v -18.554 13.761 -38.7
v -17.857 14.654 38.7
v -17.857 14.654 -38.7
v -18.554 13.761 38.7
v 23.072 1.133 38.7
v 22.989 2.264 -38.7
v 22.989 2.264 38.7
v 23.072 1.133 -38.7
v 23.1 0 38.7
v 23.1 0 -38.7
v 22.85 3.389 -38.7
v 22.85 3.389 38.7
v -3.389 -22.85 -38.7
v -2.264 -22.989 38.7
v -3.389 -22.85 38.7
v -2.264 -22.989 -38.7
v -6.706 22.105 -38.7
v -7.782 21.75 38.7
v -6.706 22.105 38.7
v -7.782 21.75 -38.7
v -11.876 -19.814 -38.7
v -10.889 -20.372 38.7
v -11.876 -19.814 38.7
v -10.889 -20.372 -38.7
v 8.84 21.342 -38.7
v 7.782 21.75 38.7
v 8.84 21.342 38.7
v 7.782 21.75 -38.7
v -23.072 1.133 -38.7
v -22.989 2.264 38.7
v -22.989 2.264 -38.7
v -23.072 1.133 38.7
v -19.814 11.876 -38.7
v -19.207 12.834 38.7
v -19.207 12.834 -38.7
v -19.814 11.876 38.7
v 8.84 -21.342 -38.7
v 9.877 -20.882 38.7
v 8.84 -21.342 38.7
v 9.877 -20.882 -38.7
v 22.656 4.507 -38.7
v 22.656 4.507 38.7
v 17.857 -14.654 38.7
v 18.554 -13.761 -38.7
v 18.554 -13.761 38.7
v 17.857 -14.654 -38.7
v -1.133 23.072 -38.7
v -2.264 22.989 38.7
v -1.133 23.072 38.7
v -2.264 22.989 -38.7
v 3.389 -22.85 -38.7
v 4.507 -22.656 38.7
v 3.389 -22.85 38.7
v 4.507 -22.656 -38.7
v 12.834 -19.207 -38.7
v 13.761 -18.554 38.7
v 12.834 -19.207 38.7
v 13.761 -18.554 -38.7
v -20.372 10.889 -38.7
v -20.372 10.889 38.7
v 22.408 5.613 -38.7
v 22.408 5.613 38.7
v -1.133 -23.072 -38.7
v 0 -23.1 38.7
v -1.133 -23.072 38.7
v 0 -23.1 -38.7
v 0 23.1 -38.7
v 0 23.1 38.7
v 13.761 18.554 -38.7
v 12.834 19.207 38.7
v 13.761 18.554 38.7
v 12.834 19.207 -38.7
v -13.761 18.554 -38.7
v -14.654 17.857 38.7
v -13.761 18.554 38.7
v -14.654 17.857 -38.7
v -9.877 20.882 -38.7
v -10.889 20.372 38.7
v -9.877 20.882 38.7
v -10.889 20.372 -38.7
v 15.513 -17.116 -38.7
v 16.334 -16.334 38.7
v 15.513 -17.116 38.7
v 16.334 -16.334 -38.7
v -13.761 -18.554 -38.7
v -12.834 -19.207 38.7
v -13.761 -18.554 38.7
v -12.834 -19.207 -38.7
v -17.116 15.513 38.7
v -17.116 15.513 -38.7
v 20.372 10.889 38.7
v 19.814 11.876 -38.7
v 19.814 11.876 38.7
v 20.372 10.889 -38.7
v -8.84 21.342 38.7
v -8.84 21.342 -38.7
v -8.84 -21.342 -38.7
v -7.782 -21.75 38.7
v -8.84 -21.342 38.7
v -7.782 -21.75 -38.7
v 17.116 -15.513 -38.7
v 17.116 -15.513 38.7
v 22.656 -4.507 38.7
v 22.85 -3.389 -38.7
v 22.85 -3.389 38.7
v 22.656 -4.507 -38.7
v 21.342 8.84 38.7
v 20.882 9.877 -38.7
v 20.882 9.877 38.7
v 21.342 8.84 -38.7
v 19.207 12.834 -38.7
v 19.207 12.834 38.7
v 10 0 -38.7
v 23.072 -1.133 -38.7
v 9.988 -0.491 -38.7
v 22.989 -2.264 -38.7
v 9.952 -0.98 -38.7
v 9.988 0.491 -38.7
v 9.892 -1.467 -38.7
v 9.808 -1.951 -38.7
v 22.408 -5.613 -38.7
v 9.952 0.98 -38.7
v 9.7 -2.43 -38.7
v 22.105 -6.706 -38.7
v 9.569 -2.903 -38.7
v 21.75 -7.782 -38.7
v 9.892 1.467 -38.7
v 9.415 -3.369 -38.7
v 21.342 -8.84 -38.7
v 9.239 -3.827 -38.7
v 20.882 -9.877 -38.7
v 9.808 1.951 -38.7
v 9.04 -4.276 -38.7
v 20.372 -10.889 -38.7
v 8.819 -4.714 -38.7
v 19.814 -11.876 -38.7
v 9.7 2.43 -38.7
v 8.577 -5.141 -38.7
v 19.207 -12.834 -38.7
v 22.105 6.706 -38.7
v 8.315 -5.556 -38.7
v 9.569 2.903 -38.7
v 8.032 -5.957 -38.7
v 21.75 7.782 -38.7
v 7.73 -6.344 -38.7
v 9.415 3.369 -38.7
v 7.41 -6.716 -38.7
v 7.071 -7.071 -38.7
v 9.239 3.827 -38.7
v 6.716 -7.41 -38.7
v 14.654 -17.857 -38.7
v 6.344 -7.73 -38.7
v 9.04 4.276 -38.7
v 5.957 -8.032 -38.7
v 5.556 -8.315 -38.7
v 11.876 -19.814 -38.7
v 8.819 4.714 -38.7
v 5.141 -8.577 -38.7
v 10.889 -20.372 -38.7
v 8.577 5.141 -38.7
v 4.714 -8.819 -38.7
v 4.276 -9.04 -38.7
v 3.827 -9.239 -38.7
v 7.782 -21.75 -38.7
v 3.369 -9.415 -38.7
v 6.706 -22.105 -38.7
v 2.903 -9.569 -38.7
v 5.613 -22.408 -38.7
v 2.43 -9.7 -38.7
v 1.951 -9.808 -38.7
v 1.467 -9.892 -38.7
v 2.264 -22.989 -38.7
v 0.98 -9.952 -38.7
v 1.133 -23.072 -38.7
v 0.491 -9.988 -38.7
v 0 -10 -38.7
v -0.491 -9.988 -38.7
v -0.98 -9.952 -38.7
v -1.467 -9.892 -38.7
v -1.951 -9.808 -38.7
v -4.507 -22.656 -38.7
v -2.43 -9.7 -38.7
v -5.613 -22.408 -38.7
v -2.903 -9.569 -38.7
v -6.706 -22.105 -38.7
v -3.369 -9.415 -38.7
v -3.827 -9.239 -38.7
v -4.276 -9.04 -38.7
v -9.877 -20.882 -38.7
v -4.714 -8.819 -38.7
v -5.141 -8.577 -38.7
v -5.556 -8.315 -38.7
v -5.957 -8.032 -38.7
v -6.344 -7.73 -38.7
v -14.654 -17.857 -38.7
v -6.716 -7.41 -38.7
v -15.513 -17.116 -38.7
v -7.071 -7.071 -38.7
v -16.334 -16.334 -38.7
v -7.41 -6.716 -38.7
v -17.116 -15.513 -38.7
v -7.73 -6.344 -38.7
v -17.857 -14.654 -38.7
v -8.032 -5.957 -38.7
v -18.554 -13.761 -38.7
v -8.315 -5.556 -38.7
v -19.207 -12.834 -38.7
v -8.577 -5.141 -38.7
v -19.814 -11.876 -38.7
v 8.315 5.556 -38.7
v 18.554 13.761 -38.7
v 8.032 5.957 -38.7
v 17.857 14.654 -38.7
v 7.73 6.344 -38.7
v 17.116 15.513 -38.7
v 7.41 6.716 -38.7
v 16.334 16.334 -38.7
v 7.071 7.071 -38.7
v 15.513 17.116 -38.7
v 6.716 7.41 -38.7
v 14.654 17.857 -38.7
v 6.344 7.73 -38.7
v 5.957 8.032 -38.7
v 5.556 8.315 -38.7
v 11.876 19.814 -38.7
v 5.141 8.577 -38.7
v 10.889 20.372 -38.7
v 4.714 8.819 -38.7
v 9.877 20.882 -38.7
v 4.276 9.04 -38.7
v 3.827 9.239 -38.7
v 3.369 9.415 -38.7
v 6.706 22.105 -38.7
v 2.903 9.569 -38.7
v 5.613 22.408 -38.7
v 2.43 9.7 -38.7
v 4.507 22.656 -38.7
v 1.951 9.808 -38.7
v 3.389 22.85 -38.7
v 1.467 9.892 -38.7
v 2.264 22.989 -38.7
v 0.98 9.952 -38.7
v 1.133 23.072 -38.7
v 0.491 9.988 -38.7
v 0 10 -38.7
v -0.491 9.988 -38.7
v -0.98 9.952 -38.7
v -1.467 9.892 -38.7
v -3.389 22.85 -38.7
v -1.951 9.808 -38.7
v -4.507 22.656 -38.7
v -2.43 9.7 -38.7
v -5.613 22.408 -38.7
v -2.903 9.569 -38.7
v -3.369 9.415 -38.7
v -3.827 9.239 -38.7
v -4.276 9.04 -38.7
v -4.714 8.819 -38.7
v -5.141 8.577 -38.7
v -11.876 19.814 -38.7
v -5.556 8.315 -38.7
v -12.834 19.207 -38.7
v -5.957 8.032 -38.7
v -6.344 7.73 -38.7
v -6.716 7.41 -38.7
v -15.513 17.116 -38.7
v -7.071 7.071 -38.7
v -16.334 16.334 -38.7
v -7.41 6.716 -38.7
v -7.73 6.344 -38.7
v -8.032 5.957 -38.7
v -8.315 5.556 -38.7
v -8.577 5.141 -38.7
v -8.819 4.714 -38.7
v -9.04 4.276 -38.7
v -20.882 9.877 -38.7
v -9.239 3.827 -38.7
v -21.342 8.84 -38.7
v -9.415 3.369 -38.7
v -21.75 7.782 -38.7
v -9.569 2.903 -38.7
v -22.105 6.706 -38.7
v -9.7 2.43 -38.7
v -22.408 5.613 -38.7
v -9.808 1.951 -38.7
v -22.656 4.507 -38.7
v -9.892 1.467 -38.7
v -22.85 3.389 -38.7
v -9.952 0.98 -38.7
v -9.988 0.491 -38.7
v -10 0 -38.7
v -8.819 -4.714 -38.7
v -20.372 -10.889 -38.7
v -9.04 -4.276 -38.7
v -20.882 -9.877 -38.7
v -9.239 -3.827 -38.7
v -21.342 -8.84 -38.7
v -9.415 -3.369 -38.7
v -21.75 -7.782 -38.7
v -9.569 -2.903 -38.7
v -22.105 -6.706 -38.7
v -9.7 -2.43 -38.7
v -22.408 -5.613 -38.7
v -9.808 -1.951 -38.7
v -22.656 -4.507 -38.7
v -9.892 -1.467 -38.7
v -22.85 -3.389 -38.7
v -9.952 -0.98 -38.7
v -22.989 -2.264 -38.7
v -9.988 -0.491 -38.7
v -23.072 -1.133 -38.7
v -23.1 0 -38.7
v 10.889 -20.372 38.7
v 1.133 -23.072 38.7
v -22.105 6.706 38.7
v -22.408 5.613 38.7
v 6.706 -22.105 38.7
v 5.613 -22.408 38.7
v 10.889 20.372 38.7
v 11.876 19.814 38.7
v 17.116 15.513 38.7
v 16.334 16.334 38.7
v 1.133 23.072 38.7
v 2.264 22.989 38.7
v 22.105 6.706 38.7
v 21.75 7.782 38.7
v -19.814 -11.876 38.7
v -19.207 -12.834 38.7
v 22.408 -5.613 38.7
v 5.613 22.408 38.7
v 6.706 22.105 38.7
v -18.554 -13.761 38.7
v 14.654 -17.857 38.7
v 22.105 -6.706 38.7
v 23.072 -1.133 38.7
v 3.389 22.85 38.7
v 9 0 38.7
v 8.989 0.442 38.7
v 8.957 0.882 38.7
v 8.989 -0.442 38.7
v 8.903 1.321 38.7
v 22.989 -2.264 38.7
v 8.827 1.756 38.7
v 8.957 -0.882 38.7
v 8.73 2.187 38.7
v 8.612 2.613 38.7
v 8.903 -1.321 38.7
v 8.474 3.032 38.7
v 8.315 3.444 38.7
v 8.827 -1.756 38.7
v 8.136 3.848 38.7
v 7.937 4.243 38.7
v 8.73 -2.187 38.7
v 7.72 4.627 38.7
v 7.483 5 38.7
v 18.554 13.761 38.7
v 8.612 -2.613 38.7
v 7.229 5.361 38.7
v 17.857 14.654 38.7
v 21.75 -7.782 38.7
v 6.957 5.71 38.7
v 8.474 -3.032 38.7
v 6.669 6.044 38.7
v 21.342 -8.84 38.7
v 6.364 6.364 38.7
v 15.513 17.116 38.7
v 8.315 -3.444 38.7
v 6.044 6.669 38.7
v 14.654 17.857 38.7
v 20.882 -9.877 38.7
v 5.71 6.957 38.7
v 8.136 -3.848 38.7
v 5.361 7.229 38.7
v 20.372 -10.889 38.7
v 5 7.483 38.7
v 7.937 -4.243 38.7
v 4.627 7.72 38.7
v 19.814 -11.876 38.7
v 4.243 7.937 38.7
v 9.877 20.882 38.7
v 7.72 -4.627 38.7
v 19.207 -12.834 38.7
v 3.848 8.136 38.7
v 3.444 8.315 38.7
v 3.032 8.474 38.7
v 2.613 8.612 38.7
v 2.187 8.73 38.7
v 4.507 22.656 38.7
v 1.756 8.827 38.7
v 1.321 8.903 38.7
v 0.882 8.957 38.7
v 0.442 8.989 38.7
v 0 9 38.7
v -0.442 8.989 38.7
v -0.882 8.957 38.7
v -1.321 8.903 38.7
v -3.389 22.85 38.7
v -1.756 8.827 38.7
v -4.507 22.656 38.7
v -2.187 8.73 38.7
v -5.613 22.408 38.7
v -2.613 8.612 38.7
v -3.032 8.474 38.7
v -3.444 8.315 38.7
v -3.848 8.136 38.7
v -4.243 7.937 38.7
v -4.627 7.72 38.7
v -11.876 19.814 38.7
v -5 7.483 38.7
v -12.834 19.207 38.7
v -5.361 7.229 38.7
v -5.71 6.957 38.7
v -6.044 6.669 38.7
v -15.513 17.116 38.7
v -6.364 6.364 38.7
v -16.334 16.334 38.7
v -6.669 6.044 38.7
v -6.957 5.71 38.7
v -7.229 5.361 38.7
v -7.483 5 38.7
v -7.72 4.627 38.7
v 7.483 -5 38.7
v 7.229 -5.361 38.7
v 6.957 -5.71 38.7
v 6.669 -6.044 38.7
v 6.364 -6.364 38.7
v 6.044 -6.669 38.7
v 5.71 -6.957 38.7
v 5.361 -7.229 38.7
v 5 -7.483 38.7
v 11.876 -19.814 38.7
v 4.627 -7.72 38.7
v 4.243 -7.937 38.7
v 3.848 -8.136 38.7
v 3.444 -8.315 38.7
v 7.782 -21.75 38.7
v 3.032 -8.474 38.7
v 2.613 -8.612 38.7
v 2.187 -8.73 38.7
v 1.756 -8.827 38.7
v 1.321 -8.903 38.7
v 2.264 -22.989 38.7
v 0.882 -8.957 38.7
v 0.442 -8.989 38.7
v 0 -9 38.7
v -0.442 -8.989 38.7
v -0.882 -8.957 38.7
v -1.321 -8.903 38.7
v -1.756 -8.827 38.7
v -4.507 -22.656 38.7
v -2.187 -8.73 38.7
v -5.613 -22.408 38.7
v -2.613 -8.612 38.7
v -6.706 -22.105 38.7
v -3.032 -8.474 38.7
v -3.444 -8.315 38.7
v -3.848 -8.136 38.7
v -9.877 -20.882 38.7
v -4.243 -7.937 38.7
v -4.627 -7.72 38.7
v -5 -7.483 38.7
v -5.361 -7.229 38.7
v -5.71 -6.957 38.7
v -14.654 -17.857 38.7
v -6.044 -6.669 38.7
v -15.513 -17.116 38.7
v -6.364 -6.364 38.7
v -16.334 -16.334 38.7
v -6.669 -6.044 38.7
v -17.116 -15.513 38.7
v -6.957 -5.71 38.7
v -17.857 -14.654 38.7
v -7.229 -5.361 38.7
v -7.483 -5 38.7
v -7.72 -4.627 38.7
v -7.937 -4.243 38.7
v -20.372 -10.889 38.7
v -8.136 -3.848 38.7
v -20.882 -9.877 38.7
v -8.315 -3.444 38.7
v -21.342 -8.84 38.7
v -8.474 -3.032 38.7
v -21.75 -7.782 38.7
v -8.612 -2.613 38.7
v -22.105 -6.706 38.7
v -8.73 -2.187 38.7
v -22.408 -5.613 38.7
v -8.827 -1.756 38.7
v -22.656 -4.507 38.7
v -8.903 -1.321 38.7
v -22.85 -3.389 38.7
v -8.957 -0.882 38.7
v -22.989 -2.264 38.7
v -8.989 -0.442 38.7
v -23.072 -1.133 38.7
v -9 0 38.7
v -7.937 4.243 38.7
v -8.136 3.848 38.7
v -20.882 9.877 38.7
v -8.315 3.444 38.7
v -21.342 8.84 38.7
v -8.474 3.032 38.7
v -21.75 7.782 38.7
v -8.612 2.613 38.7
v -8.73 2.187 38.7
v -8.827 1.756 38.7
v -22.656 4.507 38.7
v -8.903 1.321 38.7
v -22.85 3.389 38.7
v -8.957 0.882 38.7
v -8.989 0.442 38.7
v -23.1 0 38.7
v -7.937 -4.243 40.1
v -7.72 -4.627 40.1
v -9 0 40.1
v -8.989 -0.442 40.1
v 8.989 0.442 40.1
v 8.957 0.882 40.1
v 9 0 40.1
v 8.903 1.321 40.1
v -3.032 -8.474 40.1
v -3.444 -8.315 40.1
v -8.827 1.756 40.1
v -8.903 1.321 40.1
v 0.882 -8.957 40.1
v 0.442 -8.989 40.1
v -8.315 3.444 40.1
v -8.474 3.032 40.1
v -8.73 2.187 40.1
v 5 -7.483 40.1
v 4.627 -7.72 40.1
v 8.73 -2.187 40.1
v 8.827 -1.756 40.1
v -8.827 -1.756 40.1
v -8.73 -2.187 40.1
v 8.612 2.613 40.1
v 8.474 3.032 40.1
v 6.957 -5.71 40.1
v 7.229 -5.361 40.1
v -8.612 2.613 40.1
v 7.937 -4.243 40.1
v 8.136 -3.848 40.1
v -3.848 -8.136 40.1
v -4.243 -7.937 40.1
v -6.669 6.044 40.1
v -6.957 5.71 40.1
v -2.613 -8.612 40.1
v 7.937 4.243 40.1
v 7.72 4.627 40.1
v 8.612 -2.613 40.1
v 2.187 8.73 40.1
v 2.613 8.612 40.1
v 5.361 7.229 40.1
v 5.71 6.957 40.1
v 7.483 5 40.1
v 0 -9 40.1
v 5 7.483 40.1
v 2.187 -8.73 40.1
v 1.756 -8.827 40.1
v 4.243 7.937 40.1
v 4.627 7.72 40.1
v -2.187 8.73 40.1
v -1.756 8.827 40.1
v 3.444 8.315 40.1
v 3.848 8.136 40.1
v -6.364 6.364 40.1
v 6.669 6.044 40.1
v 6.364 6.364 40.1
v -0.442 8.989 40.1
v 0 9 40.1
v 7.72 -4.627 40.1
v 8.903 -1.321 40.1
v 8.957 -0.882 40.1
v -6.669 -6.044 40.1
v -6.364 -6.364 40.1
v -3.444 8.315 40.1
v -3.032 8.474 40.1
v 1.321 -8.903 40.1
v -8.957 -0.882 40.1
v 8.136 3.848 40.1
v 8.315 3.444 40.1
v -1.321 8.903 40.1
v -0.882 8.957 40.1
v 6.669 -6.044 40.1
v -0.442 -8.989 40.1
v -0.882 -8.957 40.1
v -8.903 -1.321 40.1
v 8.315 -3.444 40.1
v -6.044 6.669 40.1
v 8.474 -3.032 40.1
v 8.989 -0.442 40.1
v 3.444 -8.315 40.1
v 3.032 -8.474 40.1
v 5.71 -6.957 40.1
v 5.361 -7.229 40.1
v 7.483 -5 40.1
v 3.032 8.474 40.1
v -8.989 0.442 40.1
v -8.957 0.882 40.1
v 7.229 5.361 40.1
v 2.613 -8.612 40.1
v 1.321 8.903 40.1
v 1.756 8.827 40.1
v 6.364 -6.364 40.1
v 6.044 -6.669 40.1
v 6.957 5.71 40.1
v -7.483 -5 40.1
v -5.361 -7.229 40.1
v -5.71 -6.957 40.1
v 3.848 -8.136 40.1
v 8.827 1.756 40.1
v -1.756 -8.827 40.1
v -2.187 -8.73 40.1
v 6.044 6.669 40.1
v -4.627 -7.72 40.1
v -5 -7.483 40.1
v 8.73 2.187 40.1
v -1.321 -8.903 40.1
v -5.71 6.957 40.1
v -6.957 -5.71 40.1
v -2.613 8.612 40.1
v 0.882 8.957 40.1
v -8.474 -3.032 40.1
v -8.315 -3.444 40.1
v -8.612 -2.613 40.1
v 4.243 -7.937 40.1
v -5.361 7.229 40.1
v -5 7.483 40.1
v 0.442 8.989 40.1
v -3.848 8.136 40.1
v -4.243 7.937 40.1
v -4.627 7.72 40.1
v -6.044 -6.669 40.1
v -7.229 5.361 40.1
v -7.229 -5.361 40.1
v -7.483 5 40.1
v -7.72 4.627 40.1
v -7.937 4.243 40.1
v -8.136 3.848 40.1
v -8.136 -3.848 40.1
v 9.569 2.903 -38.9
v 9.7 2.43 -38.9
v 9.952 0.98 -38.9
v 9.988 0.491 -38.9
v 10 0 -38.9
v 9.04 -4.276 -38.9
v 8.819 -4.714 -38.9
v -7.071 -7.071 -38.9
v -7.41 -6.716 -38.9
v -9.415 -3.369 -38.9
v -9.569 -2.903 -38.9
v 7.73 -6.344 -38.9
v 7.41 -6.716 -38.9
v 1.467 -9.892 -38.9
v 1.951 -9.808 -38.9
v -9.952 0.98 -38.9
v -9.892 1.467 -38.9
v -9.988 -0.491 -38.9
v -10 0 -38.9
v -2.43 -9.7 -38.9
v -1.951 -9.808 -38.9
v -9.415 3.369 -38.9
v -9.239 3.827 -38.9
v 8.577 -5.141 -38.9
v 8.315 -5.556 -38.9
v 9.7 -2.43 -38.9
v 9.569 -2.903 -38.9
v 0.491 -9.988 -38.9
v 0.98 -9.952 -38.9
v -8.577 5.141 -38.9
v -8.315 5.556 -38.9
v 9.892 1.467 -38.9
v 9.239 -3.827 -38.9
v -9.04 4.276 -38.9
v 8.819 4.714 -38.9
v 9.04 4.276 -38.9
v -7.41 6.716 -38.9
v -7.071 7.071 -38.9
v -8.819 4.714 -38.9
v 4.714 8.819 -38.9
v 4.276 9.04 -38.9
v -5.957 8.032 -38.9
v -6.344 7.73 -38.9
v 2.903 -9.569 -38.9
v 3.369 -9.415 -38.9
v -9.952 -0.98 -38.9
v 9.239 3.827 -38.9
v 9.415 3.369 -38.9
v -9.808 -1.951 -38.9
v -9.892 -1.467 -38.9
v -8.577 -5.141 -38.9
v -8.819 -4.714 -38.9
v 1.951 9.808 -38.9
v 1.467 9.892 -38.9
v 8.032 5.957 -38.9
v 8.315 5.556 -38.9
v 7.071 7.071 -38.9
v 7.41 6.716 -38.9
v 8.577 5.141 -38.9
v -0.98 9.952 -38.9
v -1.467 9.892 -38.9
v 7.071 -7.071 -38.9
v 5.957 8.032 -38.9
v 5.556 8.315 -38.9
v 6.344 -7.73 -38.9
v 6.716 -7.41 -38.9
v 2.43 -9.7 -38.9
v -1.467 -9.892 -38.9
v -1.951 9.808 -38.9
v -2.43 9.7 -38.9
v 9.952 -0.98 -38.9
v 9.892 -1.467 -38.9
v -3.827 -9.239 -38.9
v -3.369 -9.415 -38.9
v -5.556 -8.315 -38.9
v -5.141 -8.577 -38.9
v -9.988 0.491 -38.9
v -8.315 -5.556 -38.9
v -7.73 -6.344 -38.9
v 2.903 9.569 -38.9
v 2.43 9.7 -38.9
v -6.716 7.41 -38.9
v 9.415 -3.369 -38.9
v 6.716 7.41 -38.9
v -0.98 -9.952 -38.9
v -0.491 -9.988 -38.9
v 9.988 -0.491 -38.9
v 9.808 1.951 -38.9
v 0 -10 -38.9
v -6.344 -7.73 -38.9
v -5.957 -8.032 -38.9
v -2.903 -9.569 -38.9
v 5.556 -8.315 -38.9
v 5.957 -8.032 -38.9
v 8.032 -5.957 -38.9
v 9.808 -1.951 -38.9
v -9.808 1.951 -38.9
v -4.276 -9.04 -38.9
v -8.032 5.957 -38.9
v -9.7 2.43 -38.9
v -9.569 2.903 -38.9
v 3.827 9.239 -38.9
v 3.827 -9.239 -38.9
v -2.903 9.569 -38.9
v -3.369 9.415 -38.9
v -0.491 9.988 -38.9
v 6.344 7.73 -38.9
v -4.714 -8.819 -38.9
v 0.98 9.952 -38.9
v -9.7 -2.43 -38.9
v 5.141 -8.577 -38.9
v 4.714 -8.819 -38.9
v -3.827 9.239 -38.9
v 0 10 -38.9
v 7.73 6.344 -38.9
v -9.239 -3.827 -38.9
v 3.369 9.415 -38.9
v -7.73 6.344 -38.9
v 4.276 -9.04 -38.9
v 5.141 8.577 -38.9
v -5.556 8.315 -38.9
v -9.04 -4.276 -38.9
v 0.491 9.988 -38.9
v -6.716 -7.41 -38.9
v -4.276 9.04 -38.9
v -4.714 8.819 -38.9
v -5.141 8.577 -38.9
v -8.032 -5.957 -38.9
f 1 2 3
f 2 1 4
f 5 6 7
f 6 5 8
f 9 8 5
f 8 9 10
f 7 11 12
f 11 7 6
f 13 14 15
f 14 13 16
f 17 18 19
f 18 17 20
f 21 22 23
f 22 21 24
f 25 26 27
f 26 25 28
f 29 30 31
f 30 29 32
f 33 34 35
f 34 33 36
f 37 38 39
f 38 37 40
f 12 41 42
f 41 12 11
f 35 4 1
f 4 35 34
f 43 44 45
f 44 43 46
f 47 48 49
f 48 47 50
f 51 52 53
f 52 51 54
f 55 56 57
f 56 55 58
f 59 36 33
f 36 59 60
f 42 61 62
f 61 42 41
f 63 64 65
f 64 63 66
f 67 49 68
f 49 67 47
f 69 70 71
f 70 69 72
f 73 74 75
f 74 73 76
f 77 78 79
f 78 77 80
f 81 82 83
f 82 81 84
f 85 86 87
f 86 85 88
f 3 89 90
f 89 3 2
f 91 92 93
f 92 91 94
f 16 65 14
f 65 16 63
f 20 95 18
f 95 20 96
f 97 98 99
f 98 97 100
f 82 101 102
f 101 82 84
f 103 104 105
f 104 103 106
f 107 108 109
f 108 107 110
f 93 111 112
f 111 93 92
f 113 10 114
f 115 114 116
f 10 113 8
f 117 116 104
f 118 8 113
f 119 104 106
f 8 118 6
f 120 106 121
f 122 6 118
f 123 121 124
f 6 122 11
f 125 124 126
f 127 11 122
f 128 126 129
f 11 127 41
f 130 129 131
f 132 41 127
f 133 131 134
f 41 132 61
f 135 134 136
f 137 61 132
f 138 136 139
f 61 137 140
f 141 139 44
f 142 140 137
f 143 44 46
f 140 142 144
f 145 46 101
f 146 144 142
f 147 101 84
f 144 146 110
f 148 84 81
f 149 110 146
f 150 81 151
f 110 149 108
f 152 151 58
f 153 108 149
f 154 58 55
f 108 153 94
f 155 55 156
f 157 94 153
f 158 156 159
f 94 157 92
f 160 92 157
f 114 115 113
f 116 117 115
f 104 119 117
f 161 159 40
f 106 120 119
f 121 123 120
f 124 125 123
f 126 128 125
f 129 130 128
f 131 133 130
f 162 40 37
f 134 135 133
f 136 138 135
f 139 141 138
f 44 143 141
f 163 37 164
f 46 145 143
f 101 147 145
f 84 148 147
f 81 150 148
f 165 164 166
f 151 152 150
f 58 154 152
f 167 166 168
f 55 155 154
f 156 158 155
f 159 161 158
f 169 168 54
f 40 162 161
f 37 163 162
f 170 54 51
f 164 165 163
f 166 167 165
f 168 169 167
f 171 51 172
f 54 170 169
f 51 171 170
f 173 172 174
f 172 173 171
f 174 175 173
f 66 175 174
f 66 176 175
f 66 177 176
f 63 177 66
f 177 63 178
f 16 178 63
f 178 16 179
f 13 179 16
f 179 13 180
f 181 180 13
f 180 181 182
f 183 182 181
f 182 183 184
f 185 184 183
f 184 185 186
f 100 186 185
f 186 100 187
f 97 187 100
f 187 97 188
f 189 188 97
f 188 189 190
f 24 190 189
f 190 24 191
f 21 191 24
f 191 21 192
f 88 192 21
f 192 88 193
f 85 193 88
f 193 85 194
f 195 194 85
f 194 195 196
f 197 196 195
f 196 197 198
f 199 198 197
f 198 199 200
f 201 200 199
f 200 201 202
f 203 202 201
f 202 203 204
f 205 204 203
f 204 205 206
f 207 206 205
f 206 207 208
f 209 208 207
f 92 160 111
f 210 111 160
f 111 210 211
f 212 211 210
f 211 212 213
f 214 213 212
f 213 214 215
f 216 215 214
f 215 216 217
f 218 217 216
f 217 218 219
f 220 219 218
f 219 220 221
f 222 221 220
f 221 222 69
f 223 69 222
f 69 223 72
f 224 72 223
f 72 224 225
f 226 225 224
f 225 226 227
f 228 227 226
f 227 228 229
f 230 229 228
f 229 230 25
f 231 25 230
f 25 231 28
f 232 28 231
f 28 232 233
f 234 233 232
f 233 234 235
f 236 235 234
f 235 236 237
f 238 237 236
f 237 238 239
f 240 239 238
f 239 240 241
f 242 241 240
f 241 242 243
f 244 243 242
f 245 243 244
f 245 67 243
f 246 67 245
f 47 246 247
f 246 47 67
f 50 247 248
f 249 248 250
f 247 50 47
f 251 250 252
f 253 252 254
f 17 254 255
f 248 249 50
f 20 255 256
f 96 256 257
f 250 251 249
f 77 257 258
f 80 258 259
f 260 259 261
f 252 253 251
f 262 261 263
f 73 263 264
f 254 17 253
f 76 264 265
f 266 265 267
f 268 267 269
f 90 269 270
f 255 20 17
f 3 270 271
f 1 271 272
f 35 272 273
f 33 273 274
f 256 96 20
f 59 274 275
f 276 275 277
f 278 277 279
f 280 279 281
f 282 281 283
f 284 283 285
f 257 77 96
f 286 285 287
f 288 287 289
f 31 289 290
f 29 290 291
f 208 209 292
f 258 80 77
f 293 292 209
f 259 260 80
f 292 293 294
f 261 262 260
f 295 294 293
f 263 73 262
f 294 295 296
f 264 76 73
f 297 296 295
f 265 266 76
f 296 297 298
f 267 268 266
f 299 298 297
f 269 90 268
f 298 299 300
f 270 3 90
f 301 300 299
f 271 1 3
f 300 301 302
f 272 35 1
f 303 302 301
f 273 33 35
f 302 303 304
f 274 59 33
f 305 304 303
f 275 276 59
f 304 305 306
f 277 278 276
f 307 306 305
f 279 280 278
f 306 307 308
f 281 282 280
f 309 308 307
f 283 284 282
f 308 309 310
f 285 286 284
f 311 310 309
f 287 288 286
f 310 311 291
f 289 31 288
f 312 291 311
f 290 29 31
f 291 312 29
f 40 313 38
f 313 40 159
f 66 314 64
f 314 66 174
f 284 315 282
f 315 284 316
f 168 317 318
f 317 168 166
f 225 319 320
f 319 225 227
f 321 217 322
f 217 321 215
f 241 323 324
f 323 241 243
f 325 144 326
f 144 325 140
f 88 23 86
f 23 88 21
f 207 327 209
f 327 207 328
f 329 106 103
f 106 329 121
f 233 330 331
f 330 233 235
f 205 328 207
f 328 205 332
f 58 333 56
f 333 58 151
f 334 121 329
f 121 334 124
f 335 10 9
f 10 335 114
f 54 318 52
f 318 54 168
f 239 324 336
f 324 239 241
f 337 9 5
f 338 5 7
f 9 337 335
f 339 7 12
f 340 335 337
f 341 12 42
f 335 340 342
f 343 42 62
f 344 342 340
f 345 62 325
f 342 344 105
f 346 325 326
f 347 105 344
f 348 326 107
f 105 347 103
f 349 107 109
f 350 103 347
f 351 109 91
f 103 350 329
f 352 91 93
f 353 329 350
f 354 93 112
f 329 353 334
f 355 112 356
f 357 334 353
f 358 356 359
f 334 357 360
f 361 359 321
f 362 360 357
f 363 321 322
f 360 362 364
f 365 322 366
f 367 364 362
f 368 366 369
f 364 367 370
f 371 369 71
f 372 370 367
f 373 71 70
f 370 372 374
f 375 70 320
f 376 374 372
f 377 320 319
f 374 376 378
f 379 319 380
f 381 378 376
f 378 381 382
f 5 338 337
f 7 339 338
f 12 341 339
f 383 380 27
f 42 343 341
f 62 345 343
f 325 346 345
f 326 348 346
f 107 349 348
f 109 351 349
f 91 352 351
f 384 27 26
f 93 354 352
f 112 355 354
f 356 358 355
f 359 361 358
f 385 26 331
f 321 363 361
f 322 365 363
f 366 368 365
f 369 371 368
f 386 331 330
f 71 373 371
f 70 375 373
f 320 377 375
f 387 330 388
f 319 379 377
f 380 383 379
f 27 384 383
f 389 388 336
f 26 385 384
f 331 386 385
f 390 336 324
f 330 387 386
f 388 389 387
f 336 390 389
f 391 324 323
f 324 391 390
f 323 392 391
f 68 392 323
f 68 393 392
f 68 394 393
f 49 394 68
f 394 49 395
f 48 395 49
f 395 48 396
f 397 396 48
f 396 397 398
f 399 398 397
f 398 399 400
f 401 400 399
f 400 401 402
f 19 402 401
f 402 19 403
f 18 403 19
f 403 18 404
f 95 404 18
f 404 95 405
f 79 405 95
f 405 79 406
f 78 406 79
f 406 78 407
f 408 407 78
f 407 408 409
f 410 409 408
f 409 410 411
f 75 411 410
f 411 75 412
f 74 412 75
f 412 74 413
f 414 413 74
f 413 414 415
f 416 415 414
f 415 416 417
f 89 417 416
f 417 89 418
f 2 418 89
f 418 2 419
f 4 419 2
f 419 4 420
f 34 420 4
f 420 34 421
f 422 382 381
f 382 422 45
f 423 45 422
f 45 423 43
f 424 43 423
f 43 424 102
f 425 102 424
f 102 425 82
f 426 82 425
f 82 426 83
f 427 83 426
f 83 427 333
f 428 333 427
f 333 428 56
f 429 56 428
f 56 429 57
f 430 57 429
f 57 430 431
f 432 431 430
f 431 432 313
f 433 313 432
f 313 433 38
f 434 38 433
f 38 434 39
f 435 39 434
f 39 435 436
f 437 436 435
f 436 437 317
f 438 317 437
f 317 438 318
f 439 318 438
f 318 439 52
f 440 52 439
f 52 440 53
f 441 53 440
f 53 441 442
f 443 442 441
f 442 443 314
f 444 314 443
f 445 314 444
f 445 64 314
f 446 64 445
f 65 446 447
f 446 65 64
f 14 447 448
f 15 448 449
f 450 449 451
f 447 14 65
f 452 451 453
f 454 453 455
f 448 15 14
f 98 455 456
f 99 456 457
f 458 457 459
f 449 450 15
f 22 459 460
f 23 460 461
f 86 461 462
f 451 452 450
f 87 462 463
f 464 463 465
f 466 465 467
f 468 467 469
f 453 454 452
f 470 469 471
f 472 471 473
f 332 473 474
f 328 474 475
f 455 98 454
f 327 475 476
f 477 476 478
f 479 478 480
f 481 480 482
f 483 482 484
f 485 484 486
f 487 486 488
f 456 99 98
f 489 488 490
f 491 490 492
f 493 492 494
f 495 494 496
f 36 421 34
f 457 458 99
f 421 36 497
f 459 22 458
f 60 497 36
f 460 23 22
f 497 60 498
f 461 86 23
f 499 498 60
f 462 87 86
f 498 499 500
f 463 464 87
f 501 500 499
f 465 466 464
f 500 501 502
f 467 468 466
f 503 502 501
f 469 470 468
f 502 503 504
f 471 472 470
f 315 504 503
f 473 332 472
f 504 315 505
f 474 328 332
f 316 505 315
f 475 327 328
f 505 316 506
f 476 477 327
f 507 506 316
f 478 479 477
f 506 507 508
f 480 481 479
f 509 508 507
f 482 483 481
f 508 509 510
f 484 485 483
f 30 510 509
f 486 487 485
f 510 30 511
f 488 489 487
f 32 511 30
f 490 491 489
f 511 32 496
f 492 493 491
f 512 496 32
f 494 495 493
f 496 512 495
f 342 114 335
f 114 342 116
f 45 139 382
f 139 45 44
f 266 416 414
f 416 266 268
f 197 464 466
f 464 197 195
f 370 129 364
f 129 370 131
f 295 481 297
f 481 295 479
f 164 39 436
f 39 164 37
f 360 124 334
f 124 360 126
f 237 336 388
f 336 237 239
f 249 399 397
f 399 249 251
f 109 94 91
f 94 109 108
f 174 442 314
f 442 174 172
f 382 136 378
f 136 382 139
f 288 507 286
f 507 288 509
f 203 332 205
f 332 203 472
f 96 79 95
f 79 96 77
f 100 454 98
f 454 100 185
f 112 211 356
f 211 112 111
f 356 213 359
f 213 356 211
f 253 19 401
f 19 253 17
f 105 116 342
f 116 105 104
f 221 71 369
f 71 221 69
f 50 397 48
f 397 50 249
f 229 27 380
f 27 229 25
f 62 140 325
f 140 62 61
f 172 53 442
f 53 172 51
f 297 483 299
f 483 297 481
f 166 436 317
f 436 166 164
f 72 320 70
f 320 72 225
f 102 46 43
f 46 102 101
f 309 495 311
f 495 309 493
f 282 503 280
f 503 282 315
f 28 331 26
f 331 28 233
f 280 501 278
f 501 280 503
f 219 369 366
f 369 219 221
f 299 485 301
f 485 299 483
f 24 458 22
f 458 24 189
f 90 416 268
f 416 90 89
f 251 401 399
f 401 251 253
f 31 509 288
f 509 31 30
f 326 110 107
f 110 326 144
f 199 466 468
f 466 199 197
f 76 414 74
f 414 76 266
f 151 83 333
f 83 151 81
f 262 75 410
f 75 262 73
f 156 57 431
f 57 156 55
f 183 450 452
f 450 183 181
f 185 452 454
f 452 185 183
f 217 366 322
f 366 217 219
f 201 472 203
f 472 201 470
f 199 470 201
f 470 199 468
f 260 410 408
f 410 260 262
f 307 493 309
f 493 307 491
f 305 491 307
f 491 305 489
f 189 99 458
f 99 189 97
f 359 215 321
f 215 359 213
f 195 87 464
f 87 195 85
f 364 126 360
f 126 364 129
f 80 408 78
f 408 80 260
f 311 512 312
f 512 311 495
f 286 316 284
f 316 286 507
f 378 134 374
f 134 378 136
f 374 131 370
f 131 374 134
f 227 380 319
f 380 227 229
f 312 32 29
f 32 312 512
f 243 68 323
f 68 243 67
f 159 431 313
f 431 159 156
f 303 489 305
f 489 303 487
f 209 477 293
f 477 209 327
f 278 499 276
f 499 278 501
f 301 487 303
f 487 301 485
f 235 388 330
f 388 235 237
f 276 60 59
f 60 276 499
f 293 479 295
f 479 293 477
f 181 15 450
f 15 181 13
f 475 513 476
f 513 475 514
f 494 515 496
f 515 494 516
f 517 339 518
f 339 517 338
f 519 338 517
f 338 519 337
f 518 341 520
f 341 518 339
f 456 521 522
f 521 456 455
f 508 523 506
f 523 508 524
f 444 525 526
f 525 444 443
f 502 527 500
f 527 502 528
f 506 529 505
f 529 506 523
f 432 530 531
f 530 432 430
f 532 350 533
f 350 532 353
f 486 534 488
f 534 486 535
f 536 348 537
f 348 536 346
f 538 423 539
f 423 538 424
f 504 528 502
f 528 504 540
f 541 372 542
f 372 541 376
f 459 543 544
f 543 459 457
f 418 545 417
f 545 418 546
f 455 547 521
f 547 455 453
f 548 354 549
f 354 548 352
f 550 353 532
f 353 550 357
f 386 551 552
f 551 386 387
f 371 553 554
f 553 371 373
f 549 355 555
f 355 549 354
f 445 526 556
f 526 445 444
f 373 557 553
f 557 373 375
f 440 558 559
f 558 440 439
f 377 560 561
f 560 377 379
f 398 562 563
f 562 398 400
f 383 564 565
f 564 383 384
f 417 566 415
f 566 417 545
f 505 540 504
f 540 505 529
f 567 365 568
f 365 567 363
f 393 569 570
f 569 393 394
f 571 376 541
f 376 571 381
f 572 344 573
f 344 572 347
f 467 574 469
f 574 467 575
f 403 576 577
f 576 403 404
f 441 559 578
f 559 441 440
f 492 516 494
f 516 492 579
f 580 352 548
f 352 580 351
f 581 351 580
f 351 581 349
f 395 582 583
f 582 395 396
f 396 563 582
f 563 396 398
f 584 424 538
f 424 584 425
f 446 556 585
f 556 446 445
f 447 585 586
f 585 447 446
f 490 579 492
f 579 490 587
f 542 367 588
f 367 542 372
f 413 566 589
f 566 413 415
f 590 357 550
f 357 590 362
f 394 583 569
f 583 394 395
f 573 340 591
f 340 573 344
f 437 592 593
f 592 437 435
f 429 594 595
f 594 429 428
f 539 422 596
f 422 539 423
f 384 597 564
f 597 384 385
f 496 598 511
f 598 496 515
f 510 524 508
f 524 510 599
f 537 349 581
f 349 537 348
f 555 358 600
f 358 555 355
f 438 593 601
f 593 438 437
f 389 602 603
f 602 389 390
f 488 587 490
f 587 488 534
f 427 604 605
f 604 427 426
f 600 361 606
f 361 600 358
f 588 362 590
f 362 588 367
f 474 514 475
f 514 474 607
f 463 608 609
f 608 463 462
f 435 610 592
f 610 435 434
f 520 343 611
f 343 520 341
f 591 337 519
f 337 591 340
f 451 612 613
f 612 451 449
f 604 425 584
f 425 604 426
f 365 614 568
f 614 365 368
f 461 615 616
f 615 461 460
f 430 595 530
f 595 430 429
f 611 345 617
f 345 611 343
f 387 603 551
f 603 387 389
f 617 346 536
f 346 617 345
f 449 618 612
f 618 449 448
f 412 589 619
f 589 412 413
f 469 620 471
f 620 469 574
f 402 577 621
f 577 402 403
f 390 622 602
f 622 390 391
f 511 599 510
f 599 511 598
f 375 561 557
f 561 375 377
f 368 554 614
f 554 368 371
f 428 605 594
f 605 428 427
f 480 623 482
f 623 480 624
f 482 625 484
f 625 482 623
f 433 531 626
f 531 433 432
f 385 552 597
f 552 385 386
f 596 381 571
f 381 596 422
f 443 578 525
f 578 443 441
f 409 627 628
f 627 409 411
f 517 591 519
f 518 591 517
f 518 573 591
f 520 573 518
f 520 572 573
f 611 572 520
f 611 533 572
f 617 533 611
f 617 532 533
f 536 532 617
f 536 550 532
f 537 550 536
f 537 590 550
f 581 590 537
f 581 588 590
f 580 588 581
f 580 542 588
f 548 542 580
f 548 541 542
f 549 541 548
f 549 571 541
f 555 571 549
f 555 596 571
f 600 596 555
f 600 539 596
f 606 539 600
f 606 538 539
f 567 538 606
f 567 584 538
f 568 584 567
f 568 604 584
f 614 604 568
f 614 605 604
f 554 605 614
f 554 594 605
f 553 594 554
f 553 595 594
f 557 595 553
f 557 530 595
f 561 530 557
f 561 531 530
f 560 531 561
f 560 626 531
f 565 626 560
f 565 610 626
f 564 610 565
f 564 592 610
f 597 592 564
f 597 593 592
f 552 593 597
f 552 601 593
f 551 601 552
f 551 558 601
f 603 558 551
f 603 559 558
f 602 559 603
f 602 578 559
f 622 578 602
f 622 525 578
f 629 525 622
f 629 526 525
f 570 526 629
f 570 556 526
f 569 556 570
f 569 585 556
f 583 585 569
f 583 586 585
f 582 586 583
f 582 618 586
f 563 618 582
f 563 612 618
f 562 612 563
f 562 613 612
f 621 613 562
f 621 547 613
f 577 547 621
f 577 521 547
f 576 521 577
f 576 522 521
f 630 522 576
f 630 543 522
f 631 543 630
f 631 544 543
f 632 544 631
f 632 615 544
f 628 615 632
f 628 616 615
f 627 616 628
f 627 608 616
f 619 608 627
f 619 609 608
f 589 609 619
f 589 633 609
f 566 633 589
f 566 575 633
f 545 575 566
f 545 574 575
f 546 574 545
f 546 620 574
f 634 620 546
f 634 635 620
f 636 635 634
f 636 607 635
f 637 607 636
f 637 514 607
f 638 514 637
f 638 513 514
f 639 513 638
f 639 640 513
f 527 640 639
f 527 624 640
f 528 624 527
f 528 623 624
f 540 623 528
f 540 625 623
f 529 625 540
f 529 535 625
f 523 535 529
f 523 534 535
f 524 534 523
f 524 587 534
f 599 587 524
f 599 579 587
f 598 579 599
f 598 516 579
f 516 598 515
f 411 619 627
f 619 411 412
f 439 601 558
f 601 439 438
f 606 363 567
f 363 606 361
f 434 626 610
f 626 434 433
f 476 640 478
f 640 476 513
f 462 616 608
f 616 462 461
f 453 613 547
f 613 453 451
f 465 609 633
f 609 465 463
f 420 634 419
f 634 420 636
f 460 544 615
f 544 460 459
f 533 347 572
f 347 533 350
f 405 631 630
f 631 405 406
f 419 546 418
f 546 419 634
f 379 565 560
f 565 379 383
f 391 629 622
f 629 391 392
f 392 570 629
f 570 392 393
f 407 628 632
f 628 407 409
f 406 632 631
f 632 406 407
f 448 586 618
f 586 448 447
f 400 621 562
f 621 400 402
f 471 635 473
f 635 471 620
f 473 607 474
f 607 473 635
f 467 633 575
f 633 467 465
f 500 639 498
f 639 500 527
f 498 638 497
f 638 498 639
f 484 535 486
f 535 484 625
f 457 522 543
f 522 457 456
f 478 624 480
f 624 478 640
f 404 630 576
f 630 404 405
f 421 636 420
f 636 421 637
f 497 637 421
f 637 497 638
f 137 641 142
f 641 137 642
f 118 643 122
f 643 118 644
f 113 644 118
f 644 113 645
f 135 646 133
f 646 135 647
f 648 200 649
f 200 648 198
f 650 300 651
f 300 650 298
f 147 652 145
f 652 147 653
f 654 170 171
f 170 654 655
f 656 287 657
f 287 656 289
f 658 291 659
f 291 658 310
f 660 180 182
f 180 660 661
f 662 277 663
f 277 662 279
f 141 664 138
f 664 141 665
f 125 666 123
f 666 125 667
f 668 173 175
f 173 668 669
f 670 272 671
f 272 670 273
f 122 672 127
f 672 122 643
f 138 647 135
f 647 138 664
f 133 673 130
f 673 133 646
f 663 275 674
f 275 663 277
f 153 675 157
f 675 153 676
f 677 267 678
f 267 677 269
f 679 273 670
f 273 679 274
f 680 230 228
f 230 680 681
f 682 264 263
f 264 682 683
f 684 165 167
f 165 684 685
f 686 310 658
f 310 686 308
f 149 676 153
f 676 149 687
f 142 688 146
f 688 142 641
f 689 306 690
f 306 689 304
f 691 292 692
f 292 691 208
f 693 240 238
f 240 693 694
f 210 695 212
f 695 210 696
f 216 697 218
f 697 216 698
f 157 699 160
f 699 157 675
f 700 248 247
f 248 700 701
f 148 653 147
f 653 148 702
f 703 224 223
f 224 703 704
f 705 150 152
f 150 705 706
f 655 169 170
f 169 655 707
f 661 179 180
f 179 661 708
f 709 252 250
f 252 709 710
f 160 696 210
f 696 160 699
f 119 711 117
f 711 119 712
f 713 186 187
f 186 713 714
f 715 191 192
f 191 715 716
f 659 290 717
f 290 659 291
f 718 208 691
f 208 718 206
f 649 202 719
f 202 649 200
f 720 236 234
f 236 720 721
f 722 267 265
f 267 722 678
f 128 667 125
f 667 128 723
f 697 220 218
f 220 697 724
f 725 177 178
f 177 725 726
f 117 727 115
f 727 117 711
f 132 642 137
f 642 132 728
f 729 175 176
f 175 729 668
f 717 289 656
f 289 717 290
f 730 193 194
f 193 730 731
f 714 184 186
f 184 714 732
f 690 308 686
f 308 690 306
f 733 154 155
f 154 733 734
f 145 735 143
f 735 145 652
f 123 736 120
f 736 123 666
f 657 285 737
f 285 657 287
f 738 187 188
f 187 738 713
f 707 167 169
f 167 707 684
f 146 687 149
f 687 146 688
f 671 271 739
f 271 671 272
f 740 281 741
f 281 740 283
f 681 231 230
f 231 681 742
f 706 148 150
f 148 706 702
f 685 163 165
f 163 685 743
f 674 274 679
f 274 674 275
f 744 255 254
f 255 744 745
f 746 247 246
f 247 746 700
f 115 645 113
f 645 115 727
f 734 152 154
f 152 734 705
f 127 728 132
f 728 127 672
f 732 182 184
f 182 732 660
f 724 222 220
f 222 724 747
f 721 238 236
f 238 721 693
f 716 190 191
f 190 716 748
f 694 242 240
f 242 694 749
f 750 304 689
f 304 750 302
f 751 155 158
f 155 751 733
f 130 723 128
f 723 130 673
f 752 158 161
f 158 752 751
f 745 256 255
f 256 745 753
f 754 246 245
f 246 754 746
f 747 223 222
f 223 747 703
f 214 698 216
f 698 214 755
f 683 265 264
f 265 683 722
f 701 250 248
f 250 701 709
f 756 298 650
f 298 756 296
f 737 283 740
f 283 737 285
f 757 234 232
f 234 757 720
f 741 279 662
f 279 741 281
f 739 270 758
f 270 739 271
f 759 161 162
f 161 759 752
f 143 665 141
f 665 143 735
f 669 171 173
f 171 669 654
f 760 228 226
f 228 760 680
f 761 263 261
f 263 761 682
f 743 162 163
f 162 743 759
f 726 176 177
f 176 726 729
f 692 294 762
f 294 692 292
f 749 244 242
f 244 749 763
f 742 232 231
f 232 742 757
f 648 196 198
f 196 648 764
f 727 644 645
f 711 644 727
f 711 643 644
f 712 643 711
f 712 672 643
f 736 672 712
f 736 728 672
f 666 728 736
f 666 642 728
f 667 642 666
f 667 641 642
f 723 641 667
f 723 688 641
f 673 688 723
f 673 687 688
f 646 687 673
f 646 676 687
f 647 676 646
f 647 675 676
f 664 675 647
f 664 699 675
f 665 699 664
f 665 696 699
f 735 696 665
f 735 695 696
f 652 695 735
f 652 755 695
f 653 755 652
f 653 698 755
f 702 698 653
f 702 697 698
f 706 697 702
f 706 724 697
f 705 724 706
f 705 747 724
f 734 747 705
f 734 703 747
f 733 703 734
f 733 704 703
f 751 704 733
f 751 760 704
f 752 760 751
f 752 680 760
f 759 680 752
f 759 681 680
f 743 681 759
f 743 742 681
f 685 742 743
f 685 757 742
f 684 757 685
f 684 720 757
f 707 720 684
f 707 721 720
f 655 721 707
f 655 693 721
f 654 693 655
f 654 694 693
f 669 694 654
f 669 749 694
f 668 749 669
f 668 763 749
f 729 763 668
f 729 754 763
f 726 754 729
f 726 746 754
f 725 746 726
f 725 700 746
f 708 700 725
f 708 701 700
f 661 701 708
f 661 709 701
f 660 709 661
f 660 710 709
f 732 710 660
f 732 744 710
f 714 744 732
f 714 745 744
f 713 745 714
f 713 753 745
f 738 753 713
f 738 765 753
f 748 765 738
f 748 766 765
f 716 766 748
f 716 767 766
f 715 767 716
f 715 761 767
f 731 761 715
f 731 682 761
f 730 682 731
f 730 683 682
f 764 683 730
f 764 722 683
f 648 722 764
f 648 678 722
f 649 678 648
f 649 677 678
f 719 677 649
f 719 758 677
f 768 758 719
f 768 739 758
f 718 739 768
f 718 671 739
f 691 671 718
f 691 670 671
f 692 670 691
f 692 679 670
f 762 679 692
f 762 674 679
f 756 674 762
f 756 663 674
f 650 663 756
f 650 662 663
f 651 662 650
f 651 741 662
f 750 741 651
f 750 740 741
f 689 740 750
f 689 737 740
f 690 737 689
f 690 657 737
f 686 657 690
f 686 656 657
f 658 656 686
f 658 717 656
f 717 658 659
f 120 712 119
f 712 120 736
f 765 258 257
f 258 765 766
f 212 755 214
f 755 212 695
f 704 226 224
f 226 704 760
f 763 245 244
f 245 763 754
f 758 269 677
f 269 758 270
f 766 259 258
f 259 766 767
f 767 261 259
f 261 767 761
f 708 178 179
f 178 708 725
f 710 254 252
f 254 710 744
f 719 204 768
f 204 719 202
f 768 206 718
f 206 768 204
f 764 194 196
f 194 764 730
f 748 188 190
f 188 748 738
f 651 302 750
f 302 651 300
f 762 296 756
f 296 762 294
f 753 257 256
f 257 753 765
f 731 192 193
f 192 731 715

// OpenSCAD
$fn = 128;

// Target overall size
height_mm   = 80.2;
diameter_mm = 46.2;

// Terminal details (kept within overall height)
positive_terminal_diameter_mm = 18.0;
positive_terminal_height_mm   = 2.0;

negative_terminal_diameter_mm = 20.0;
negative_terminal_height_mm   = 0.8;

overlap_mm = 0.6; // small overlap to guarantee one connected solid

module battery_cell() {
    r_body = diameter_mm/2;

    // Keep total height exactly height_mm by shortening the main body
    body_h = height_mm - positive_terminal_height_mm - negative_terminal_height_mm;

    union() {
        // Main cylindrical body centered at origin
        cylinder(h=body_h, r=r_body, center=true);

        // Positive terminal on top (connected with overlap)
        translate([0, 0, body_h/2 + positive_terminal_height_mm/2 - overlap_mm])
            cylinder(h=positive_terminal_height_mm, r=positive_terminal_diameter_mm/2, center=true);

        // Negative terminal on bottom (connected with overlap)
        translate([0, 0, -(body_h/2 + negative_terminal_height_mm/2 - overlap_mm)])
            cylinder(h=negative_terminal_height_mm, r=negative_terminal_diameter_mm/2, center=true);
    }
}

battery_cell();
